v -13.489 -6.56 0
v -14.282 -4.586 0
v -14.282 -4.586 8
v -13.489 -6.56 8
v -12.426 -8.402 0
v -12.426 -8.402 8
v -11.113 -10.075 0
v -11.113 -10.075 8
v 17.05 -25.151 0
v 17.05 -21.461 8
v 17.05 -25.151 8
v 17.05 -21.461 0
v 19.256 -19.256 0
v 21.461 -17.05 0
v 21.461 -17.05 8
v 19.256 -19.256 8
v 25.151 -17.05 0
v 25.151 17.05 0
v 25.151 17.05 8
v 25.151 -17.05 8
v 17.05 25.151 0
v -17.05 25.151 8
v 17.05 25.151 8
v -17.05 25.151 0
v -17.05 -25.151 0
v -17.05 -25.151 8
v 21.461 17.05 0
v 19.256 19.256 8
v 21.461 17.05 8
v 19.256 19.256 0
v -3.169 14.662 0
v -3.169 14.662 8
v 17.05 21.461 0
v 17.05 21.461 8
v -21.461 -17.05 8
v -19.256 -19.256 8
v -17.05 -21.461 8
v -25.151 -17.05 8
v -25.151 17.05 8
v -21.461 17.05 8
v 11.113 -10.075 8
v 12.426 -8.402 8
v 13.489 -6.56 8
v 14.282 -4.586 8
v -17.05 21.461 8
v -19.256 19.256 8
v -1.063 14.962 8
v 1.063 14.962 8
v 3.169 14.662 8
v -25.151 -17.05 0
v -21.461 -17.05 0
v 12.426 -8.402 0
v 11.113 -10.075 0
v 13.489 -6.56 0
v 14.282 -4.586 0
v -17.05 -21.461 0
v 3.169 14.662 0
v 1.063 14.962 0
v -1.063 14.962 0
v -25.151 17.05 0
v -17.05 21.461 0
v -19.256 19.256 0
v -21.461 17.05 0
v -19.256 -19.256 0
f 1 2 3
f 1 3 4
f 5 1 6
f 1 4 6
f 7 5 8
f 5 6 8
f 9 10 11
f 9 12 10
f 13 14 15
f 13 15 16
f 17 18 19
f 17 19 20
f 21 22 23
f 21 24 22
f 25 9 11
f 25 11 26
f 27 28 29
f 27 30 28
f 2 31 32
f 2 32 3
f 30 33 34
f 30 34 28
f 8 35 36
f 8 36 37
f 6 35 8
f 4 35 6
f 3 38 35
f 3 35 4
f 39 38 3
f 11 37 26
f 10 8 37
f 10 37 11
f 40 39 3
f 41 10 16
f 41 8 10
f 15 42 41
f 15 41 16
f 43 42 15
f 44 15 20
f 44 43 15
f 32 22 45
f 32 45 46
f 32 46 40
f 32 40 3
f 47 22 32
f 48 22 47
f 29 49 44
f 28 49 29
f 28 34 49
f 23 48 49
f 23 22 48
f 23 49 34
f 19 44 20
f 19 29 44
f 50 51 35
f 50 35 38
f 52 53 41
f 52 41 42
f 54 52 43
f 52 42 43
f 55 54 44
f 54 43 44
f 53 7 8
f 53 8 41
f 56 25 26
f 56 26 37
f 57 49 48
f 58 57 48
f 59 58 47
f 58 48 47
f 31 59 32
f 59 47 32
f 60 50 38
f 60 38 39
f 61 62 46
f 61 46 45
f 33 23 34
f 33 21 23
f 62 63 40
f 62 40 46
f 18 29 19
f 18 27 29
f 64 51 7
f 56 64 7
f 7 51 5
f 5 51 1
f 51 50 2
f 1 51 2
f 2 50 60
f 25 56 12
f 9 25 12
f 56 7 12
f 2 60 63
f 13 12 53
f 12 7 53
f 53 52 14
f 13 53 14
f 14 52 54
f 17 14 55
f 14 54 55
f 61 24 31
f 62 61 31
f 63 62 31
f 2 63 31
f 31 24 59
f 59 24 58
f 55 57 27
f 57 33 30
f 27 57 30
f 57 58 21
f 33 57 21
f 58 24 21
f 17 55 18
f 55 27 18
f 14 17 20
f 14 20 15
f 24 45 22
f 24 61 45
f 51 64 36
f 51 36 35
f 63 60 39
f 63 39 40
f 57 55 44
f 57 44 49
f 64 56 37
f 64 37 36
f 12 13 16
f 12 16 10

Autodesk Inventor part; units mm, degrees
ref_plane "YZ Plane" through (0, 0, 0) normal (1, 0, 0) x (0, 1, 0)
ref_plane "XZ Plane" through (0, 0, 0) normal (0, 1, 0) x (-1, 0, 0)
ref_plane "XY Plane" through (0, 0, 0) normal (0, 0, 1) x (1, 0, 0)
sketch "Sketch1" plane through (0, 0, 0) normal (0, 0, 1) x (1, 0, 0)
  line L0 (-35.2109, 0) -> (35.2109, 0) construction
  line L1 (0, -35.2109) -> (0, 35.2109) construction
  line L2 (0, 0) -> (13.4339, 13.4339) construction
  line L3 (0, 0) -> (18.9985, 0) construction
  line L4 (0, 25.1006) -> (17, 25.1006)
  line L5 (17, 25.1006) -> (17, 21.4406)
  line L6 (17, 21.4406) -> (19.2203, 19.2203)
  line L7 (25.1006, 0) -> (25.1006, 17)
  line L8 (25.1006, 17) -> (21.4406, 17)
  line L9 (21.4406, 17) -> (19.2203, 19.2203)
  line L10 (0, 0) -> (-13.4339, 13.4339) construction
  line L11 (0, 0) -> (-18.9985, 0) construction
  line L12 (0, 25.1006) -> (-17, 25.1006)
  line L13 (-17, 25.1006) -> (-17, 21.4406)
  line L14 (-17, 21.4406) -> (-19.2203, 19.2203)
  line L15 (-25.1006, 0) -> (-25.1006, 17)
  line L16 (-25.1006, 17) -> (-21.4406, 17)
  line L17 (-21.4406, 17) -> (-19.2203, 19.2203)
  line L18 (0, 0) -> (13.4339, -13.4339) construction
  line L19 (0, -25.1006) -> (17, -25.1006)
  line L20 (17, -25.1006) -> (17, -21.4406)
  line L21 (17, -21.4406) -> (19.2203, -19.2203)
  line L22 (25.1006, 0) -> (25.1006, -17)
  line L23 (25.1006, -17) -> (21.4406, -17)
  line L24 (21.4406, -17) -> (19.2203, -19.2203)
  line L25 (0, 0) -> (-13.4339, -13.4339) construction
  line L26 (0, -25.1006) -> (-17, -25.1006)
  line L27 (-17, -25.1006) -> (-17, -21.4406)
  line L28 (-17, -21.4406) -> (-19.2203, -19.2203)
  line L29 (-25.1006, 0) -> (-25.1006, -17)
  line L30 (-25.1006, -17) -> (-21.4406, -17)
  line L31 (-21.4406, -17) -> (-19.2203, -19.2203)
  line L32 (-17.05, 25.1506) -> (0, 25.1506)
  line L33 (0, 25.1506) -> (17.05, 25.1506)
  line L34 (17.05, 25.1506) -> (17.05, 21.4613)
  line L35 (17.05, 21.4613) -> (19.2557, 19.2557)
  line L36 (19.2557, 19.2557) -> (21.4613, 17.05)
  line L37 (21.4613, 17.05) -> (25.1506, 17.05)
  line L38 (25.1506, 17.05) -> (25.1506, 0)
  line L39 (25.1506, 0) -> (25.1506, -17.05)
  line L40 (25.1506, -17.05) -> (21.4613, -17.05)
  line L41 (21.4613, -17.05) -> (19.2557, -19.2557)
  line L42 (19.2557, -19.2557) -> (17.05, -21.4613)
  line L43 (17.05, -21.4613) -> (17.05, -25.1506)
  line L44 (17.05, -25.1506) -> (0, -25.1506)
  line L45 (0, -25.1506) -> (-17.05, -25.1506)
  line L46 (-17.05, -25.1506) -> (-17.05, -21.4613)
  line L47 (-17.05, -21.4613) -> (-19.2557, -19.2557)
  line L48 (-19.2557, -19.2557) -> (-21.4613, -17.05)
  line L49 (-21.4613, -17.05) -> (-25.1506, -17.05)
  line L50 (-25.1506, -17.05) -> (-25.1506, 0)
  line L51 (-25.1506, 0) -> (-25.1506, 17.05)
  line L52 (-25.1506, 17.05) -> (-21.4613, 17.05)
  line L53 (-21.4613, 17.05) -> (-19.2557, 19.2557)
  line L54 (-19.2557, 19.2557) -> (-17.05, 21.4613)
  line L55 (-17.05, 21.4613) -> (-17.05, 25.1506)
  dimension "d0" = 45
  dimension "d1" = 3.14
  dimension "d2" = 3.66
  dimension "d3" = 17
  dimension "d23" = 0.05
extrude "Extrusion1" add sketch "Sketch1" along normal blind 8 contours L4 L5 L6 L9 L8 L7 L22 L23 L24 L21 L20 L19 L26 L27 L28 L31 L30 L29 L15 L16 L17 L14 L13 L12 | L32 L33 L34 L35 L36 L37 L38 L39 L40 L41 L42 L43 L44 L45 L46 L47 L48 L49 L50 L51 L52 L53 L54 L55
hole "Hole1" at (0, 0, 0) direction (0, 0, 1) diameter 30 end through all
sketch "Sketch2" plane through (0, 0, 0) normal (0, 0, -1) x (-1, 0, 0)
  circle A0 centre (0, 0) radius 15 projected
  line L0 (3.1688, 14.6615) -> (14.2816, -4.5865)
  line L1 (11.1128, -10.075) -> (-11.1128, -10.075)
  line L2 (-14.2816, -4.5865) -> (-3.1688, 14.6615)
  circle A1 centre (0, 0) radius 10.075 construction
  circle A2 centre (0, 0) radius 15 construction
  circle A3 centre (0, 0) radius 15 construction
  arc A4 (14.2816, -4.5865) -> (3.1688, 14.6615) centre (0, 0) ccw
  arc A5 (-11.1128, -10.075) -> (11.1128, -10.075) centre (0, 0) ccw
  arc A6 (-3.1688, 14.6615) -> (-14.2816, -4.5865) centre (0, 0) ccw
  dimension "d22" = 20.15
extrude "Extrusion2" add sketch "Sketch2" against normal up to surface (8 mm away) contours A0 L0 | L2 A0 | A0 L1
equation "\"Lens_diameter\" = 25"
properties part number "20_IM_Cube_Insert_Lens_holder_RMS_63x"
